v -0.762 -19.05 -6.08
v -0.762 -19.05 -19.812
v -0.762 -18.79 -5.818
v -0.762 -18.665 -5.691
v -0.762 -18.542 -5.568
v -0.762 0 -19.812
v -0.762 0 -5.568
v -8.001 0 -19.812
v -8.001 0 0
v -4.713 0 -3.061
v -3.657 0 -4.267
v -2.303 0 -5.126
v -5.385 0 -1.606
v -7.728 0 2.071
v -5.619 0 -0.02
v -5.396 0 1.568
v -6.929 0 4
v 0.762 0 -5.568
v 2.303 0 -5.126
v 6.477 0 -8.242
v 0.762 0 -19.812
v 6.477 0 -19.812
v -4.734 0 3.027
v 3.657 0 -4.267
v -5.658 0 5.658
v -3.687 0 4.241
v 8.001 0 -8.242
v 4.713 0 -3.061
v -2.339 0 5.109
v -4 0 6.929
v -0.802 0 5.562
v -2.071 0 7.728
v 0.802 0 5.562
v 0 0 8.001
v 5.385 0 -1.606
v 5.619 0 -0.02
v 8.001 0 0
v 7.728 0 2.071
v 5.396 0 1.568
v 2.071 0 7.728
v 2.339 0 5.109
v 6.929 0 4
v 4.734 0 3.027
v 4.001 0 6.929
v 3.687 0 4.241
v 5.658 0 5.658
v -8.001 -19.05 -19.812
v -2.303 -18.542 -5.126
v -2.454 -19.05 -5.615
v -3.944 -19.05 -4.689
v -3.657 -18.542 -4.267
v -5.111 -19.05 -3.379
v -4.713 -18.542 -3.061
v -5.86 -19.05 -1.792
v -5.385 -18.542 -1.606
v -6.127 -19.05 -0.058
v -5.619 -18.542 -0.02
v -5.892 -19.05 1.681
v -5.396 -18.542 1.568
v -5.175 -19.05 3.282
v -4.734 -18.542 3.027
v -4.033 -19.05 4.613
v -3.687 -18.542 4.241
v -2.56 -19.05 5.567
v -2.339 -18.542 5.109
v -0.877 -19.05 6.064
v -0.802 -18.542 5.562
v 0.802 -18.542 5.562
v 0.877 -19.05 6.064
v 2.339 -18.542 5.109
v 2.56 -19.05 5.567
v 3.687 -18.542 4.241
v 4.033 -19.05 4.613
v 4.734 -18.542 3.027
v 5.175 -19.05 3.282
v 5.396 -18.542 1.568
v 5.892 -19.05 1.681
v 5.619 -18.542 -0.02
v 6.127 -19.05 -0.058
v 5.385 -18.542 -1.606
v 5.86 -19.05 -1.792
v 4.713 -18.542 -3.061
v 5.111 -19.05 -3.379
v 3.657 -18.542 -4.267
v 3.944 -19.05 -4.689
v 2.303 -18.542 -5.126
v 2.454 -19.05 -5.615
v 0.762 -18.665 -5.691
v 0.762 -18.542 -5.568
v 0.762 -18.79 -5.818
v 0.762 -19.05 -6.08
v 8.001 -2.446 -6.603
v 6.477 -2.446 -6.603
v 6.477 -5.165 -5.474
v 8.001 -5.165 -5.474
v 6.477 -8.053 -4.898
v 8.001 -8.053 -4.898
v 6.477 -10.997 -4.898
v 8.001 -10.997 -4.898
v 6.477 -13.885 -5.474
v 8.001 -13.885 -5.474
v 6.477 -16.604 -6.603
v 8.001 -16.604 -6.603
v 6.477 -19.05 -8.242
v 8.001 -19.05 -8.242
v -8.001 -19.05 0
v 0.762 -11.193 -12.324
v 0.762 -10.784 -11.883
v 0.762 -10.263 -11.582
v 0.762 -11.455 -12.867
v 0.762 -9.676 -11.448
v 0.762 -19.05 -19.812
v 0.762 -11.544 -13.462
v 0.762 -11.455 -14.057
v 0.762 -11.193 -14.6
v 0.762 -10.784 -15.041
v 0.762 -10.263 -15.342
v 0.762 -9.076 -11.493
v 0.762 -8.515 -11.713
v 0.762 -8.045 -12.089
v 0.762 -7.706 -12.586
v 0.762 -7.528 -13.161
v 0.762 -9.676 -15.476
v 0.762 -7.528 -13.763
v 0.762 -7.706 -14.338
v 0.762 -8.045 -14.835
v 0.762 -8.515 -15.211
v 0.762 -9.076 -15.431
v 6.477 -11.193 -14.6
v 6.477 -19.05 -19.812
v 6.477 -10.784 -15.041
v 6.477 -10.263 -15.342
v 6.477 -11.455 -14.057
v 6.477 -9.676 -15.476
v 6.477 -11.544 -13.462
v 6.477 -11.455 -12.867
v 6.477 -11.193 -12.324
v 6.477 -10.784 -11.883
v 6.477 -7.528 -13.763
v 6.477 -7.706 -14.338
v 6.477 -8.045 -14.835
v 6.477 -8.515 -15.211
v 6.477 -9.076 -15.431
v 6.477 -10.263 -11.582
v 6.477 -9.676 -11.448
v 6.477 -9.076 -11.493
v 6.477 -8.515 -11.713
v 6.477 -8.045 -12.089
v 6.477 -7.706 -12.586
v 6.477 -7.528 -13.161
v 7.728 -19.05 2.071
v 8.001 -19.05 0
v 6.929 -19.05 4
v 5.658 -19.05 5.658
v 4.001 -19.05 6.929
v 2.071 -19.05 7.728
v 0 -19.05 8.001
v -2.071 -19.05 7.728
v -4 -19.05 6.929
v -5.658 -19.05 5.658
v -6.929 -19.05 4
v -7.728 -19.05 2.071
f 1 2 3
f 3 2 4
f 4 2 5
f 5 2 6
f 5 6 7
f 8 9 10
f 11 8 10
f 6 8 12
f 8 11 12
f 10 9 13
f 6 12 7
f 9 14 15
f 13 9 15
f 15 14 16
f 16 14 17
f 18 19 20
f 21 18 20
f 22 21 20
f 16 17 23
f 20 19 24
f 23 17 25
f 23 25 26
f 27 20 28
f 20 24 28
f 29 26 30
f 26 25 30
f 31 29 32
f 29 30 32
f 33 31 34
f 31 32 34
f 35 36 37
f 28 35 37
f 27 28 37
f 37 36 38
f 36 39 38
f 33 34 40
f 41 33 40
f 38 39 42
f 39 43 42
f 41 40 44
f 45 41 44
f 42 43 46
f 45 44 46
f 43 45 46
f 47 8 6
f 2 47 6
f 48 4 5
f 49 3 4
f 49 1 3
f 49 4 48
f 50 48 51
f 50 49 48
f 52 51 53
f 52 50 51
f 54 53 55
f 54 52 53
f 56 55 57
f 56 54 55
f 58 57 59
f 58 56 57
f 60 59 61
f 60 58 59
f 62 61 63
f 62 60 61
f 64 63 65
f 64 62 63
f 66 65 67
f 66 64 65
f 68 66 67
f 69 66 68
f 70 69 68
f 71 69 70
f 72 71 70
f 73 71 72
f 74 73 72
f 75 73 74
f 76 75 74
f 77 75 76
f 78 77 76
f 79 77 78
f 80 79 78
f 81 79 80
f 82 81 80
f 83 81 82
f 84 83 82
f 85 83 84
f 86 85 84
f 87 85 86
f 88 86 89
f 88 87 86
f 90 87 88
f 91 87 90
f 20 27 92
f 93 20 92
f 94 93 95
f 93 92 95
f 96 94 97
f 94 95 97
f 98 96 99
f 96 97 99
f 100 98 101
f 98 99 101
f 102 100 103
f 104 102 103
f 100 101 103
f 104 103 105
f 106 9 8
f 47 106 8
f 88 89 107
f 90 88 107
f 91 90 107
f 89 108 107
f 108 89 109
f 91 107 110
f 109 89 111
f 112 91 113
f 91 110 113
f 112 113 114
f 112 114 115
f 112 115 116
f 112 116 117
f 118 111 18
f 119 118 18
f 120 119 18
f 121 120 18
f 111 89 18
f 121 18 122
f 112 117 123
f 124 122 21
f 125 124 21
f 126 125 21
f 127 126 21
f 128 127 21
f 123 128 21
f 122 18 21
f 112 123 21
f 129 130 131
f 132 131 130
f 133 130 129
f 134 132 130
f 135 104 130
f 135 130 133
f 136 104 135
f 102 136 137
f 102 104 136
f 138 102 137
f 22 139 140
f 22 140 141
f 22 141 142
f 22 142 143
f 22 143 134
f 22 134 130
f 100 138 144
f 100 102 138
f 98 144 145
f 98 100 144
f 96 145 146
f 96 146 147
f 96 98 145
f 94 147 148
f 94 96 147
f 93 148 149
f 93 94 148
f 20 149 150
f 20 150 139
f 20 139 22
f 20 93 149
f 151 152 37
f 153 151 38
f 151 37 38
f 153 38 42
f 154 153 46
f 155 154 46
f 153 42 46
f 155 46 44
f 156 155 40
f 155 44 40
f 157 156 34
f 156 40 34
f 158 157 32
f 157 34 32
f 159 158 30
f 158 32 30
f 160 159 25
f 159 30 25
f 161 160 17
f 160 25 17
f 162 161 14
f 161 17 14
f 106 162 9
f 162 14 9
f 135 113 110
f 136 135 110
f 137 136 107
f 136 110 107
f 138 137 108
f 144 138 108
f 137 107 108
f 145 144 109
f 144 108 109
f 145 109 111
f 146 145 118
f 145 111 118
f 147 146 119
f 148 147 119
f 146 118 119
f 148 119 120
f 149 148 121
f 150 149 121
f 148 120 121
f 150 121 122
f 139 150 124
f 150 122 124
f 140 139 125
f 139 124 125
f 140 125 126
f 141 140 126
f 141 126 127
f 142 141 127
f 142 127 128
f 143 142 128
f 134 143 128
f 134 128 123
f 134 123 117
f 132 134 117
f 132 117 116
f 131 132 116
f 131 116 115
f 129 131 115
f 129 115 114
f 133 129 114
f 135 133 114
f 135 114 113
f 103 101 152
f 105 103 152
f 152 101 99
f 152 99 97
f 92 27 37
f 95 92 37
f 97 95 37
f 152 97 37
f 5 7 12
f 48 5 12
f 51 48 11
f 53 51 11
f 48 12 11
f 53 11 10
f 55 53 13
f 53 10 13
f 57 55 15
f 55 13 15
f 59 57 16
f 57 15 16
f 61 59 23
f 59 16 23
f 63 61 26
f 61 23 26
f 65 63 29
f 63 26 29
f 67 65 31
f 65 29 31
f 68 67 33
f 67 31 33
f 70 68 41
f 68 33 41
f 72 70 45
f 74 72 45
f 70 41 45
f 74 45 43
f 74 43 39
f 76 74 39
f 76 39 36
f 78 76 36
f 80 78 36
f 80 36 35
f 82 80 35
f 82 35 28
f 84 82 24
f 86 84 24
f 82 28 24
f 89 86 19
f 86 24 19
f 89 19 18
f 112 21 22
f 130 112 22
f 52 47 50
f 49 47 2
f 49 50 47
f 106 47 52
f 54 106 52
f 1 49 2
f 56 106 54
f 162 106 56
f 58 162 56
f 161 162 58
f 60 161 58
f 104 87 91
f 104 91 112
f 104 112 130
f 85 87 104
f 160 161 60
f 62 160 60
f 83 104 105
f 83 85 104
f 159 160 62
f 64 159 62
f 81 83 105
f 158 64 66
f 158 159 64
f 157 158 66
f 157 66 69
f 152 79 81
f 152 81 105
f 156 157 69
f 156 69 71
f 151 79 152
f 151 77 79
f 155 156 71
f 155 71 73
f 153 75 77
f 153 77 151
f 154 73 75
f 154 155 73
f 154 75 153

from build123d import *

# Parameters (mm, degrees)
F1_DEPTH = 19.05
F2_SIZE  = 0.508
F4_DEPTH = 1.524
F6_D     = 4.0386
F6_DEPTH = 5.93725
F6_TIP   = 1.213317848


with BuildPart() as f1:
    # F0 (on Front) → F1 (new body)
    with BuildSketch(Plane.XZ):
        with BuildLine():
            Line((8.001, -19.812), (8.001, 0))
            ThreePointArc((8.001, 0), (0, 8.001), (-8.001, 0))
            Line((-8.001, 0), (-8.001, -19.812))
            Line((-8.001, -19.812), (-0.762, -19.812))
            Line((-0.762, -19.812), (-0.762, -5.5675371219))
            ThreePointArc((-0.762, -5.5675371219), (0, 5.6194406842), (0.762, -5.5675371219))
            Line((0.762, -5.5675371219), (0.762, -19.812))
            Line((0.762, -19.812), (8.001, -19.812))
        make_face()
    extrude(amount=F1_DEPTH)

    # F2
    f2_edges = [f1.edges().sort_by_distance(p)[0] for p in [
        (0, -19.05, 5.619441),
    ]]
    chamfer(f2_edges, length=F2_SIZE)

    # F3 (on face) → F4 (cut)
    with BuildSketch(Plane.YZ.offset(8.001)):
        with BuildLine():
            Line((0, -19.812), (0, -8.2424463785))
            ThreePointArc((0, -8.2424463785), (-9.525, -4.826), (-19.05, -8.2424463785))
            Line((-19.05, -8.2424463785), (-19.05, -19.812))
            Line((-19.05, -19.812), (0, -19.812))
        make_face()
    extrude(amount=-F4_DEPTH, mode=Mode.SUBTRACT)

    # F6
    with Locations(Plane.YZ.offset(6.477)):
        with Locations((-9.525, -13.462)):
            Hole(F6_D / 2, depth=F6_DEPTH)
            with Locations((0, 0, -(F6_DEPTH + F6_TIP / 2))):  # 118° drill point
                Cone(0, F6_D / 2, F6_TIP, mode=Mode.SUBTRACT)


solid = f1.part
